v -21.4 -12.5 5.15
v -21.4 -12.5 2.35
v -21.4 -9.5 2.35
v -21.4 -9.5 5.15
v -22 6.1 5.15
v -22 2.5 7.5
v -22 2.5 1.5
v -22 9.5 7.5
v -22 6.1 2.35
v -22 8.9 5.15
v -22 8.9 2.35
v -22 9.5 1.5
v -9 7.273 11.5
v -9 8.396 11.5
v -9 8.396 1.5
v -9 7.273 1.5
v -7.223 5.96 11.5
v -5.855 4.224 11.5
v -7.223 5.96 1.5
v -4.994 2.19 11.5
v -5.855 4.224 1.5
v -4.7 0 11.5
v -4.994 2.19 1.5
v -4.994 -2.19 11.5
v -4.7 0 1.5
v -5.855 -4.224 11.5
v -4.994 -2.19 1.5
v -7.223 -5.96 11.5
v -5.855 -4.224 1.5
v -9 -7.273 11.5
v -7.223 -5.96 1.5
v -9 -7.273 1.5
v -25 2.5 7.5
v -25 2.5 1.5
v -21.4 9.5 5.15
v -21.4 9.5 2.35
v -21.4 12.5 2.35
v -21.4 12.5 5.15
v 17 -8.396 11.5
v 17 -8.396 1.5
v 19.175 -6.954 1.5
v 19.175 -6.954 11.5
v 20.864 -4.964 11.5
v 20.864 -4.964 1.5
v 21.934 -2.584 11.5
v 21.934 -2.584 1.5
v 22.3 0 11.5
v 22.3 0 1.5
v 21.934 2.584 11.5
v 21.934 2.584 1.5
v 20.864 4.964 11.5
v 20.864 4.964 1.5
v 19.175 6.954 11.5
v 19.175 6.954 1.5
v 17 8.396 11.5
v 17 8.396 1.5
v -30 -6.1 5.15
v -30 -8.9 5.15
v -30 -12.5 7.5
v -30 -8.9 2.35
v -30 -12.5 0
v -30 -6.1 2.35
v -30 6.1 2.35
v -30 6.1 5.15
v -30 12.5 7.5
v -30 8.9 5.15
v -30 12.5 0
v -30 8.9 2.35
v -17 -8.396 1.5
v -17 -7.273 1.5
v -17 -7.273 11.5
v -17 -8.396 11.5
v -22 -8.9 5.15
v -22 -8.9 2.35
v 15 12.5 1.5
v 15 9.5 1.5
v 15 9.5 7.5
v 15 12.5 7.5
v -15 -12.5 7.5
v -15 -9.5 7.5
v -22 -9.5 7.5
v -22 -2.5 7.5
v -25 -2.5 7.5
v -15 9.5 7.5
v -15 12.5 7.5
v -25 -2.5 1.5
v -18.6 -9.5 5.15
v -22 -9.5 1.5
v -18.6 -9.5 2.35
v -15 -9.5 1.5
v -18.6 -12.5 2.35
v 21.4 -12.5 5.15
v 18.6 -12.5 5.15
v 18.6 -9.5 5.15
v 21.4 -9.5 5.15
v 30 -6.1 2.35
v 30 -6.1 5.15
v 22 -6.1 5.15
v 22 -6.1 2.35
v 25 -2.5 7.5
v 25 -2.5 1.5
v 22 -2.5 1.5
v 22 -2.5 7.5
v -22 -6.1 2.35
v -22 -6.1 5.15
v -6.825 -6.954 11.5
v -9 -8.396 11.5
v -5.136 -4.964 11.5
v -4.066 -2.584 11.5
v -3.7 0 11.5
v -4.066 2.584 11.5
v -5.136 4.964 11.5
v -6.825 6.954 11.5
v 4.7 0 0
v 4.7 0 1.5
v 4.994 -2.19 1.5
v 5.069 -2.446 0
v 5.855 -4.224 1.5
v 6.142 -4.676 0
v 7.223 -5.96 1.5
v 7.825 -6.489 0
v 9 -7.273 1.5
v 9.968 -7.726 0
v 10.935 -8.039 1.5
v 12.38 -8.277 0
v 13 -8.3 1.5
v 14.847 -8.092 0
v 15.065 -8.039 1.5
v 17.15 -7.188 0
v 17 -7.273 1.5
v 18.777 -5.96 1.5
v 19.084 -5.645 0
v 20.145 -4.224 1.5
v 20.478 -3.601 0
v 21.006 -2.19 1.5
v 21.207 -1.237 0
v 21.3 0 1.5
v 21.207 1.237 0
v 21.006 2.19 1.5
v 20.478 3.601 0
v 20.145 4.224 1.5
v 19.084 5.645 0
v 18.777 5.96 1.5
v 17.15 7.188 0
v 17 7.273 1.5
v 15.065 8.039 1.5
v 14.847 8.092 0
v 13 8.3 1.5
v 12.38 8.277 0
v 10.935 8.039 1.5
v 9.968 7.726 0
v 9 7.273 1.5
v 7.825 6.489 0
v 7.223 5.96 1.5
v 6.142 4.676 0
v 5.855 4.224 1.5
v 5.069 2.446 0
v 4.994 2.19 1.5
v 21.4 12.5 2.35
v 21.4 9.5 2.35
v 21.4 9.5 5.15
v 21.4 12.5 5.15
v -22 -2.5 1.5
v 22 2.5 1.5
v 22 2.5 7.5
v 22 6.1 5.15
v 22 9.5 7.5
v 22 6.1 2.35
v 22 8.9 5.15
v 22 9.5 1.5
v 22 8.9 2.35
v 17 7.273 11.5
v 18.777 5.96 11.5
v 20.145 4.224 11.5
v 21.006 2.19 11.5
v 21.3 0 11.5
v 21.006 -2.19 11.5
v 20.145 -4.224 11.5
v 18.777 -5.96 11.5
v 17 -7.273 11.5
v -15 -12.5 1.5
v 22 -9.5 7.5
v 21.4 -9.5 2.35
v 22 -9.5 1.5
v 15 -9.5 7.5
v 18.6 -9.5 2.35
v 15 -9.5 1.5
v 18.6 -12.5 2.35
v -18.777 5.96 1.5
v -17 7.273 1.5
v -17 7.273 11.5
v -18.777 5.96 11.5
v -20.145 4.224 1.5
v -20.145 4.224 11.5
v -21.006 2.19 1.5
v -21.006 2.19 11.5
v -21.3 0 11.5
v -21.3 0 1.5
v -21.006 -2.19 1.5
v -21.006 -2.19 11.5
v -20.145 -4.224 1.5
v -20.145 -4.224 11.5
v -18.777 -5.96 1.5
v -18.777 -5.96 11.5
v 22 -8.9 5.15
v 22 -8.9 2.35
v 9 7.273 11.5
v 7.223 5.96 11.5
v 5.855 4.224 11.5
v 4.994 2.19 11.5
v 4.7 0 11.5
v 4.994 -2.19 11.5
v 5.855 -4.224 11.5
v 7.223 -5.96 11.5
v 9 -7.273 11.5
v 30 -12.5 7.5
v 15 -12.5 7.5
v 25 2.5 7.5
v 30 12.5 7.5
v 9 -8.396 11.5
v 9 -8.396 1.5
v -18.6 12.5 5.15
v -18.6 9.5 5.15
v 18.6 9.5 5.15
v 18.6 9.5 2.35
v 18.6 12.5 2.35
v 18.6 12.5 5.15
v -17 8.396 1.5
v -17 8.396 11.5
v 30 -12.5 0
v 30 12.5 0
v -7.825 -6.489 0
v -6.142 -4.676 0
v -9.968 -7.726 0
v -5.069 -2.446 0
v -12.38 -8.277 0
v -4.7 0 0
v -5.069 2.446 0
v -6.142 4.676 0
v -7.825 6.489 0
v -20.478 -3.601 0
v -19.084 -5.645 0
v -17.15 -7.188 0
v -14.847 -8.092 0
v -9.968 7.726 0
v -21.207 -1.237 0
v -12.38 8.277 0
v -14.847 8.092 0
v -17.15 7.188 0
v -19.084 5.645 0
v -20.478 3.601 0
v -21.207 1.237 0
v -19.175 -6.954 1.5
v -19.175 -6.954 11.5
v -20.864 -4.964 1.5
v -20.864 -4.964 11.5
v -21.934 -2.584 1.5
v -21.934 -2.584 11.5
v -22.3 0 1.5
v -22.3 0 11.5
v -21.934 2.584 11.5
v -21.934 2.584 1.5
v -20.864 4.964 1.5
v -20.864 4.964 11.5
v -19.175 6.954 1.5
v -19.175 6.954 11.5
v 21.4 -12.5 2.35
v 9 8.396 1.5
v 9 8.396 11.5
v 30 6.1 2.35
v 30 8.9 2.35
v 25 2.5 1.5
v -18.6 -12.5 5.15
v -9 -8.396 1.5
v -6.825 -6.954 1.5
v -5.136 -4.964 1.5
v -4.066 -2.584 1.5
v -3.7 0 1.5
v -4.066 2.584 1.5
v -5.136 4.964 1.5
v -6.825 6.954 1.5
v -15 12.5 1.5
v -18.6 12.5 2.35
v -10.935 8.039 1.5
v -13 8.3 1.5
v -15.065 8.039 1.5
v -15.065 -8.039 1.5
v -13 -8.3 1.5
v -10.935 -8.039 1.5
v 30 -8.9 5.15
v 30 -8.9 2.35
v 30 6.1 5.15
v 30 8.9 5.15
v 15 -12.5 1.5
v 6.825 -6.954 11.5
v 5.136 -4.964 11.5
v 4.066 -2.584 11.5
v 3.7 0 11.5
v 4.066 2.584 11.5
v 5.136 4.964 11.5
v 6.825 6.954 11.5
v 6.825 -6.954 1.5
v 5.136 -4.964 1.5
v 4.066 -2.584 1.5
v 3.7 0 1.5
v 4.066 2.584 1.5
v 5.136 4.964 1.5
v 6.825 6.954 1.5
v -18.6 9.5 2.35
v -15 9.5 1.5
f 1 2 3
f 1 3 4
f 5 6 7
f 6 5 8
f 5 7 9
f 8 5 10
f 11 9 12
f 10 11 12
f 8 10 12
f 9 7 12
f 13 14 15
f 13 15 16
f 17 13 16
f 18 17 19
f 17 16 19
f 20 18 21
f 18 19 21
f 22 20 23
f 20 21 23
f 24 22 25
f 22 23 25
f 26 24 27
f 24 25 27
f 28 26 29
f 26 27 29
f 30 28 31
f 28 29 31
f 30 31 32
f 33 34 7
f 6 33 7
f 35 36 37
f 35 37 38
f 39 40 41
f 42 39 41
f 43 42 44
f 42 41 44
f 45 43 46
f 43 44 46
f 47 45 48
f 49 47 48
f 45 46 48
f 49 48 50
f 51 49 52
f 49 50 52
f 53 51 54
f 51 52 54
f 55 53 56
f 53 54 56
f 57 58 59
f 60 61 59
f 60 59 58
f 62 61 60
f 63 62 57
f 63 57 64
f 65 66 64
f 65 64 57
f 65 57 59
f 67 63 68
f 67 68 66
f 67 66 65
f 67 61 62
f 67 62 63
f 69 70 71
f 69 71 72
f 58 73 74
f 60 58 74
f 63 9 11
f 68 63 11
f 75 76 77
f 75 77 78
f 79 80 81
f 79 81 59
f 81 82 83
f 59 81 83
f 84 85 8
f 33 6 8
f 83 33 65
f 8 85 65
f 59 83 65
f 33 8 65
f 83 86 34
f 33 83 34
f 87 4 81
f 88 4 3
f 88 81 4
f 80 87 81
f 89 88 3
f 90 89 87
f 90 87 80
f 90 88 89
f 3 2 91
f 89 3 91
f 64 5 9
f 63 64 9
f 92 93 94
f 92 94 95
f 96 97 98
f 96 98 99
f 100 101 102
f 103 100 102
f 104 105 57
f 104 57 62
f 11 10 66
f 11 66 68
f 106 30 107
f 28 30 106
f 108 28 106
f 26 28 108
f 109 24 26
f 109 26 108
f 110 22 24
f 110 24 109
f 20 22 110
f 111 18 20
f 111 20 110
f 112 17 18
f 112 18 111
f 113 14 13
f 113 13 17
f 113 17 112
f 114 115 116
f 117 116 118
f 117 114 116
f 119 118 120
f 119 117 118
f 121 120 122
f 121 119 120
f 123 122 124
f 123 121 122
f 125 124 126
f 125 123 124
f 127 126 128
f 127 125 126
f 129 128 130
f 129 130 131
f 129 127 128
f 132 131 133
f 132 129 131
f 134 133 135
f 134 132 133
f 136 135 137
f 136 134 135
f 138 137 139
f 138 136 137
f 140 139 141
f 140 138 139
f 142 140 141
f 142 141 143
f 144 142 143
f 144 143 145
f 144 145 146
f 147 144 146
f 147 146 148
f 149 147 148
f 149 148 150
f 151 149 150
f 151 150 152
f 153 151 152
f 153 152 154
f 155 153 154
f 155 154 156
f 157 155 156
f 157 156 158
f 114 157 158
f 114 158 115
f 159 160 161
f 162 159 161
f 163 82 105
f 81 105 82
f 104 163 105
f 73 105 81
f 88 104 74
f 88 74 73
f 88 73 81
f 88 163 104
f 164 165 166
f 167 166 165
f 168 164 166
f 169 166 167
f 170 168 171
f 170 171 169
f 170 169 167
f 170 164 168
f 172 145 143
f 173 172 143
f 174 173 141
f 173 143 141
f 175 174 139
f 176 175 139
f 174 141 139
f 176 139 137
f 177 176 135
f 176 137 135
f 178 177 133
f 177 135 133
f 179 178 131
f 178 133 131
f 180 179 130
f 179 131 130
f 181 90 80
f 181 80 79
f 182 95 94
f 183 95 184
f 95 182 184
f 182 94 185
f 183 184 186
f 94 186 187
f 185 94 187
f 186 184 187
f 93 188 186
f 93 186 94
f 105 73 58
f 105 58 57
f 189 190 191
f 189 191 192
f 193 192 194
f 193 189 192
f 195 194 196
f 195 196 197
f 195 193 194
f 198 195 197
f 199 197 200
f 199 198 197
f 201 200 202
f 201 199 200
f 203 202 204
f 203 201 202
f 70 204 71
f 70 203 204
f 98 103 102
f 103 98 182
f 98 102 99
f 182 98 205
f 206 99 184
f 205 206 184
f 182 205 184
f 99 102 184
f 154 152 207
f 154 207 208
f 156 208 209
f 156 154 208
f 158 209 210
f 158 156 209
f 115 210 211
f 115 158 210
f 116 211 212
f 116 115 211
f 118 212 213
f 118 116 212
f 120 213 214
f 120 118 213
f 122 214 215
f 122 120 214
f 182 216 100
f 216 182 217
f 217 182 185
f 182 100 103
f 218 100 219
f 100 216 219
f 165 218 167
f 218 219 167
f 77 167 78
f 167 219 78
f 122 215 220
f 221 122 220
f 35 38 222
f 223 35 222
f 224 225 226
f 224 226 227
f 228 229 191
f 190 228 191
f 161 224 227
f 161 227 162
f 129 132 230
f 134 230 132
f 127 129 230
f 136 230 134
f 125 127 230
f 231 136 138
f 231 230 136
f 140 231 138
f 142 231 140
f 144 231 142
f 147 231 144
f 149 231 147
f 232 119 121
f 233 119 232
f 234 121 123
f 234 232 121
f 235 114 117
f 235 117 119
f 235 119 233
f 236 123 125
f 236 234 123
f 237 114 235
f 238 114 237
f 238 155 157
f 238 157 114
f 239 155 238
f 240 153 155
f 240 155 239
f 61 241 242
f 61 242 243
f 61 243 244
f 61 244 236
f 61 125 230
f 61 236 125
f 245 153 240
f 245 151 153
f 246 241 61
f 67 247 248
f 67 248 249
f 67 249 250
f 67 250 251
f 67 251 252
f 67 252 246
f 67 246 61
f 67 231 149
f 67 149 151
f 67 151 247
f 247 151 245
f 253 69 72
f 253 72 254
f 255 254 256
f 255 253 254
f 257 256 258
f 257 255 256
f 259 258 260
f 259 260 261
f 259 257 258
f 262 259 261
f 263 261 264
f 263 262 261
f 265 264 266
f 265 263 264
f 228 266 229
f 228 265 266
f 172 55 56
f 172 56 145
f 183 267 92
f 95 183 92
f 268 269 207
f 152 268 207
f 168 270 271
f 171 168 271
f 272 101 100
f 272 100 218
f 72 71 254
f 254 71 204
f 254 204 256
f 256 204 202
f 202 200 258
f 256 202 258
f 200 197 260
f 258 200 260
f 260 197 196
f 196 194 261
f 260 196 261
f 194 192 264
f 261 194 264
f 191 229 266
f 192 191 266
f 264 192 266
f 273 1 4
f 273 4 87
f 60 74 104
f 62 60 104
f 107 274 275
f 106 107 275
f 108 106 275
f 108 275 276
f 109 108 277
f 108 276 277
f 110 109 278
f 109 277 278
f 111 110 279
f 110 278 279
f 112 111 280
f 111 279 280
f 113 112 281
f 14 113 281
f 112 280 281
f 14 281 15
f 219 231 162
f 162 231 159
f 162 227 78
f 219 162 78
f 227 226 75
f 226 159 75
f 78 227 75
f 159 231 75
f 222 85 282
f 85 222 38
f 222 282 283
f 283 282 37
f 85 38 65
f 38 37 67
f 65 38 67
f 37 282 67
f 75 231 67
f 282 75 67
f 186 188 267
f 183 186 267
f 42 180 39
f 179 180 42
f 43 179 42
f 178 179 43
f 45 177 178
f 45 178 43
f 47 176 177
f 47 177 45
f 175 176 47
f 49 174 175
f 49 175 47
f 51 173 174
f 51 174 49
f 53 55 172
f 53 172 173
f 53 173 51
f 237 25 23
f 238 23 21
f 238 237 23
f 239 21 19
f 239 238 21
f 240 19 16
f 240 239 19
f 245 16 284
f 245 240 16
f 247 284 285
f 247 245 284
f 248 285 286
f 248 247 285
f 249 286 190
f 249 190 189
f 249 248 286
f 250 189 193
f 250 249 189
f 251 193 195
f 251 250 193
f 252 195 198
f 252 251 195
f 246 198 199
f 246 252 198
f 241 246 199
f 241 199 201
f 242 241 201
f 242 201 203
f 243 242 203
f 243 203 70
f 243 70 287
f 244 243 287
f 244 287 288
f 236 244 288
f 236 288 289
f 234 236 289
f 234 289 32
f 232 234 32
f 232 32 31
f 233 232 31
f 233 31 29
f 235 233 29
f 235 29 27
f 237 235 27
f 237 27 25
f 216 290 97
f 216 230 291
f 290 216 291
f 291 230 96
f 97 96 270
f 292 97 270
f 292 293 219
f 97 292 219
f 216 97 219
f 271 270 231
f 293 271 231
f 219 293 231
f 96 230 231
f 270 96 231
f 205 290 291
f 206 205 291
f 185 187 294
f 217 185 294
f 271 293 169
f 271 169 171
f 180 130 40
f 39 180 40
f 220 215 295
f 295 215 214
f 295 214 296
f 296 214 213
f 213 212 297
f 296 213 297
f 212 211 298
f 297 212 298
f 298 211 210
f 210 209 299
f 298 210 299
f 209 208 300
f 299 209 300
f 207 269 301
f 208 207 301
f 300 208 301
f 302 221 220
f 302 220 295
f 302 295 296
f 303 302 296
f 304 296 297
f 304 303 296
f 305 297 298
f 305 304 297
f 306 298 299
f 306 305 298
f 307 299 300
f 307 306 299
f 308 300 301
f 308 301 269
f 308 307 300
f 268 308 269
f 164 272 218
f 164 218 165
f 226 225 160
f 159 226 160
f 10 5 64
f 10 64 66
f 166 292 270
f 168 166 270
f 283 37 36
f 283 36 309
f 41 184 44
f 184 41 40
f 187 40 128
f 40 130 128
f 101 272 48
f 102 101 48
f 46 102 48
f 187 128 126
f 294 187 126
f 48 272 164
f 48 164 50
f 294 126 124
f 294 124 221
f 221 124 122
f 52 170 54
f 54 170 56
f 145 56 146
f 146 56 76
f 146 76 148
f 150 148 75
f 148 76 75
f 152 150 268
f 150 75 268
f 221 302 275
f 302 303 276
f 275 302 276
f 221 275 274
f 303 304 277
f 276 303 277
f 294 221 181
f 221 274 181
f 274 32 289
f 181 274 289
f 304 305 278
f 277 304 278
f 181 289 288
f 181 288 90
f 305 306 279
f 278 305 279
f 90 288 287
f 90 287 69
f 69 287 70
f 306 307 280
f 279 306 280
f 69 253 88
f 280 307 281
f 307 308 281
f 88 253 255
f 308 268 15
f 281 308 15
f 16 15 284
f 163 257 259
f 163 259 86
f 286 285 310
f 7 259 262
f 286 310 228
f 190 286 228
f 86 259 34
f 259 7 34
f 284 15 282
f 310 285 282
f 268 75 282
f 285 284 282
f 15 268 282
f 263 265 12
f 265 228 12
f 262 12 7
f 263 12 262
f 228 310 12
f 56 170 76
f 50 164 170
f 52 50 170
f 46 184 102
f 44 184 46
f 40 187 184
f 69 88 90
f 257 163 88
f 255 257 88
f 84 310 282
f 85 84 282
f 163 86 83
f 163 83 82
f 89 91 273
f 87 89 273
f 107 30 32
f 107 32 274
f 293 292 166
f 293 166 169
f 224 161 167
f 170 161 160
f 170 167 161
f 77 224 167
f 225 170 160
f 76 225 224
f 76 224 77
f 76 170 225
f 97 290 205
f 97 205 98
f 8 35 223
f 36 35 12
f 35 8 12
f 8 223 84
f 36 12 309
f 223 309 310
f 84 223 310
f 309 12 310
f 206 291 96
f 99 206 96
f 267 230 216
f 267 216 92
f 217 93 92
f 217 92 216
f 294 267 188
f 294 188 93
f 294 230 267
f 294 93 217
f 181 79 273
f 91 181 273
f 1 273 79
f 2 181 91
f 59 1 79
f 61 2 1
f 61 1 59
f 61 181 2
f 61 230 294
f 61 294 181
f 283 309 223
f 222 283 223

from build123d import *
from build123d.topology import SkipClean

# Parameters (mm, degrees)
ESBO_O1_R                = 8.3
RESSALTO_EXTRUS_O1_DEPTH = 1.5
RESSALTO_EXTRUS_O2_DEPTH = 6
ESBO_O3_W                = 2.8
ESBO_O3_H                = 2.8
CORTE_EXTRUS_O1_DEPTH    = 37.142080737
ESBO_O4_W                = 2.8
ESBO_O4_H                = 2.8
CORTE_EXTRUS_O2_DEPTH    = 53.08166664
ESBO_O6_W                = 5
ESBO_O6_H                = 25
RESSALTO_EXTRUS_O5_DEPTH = 7.5
ESBO_O7_W                = 2.8
ESBO_O7_H                = 2.8
CORTE_EXTRUS_O3_DEPTH    = 60
RESSALTO_EXTRUS_O3_DEPTH = 10


with BuildPart() as part:
    # Esboço1 → Ressalto-extrusão1 (new body)
    with BuildSketch(Plane.XY):
        Polygon((-25, -12.5), (-25, 12.5), (25, 12.5), (25, -12.5), (15, -12.5), (-15, -12.5), align=None)
        with Locations((-13, 0)):
            Circle(ESBO_O1_R, mode=Mode.SUBTRACT)
        with Locations(Location((13, 0, 0), (0, 0, 180))):
            Circle(ESBO_O1_R, mode=Mode.SUBTRACT)
    extrude(amount=RESSALTO_EXTRUS_O1_DEPTH)

    # Esboço2 → Ressalto-extrusão2 (add)
    with BuildSketch(Plane.XY.offset(1.5)):
        Polygon((-20, -12.5), (-25, -12.5), (-25, -2.5), (-22, -2.5), (-22, -9.5), (-15, -9.5), (-15, -12.5), align=None)
        Polygon((22, -2.5), (22, -9.5), (15, -9.5), (15, -12.5), (20, -12.5), (25, -12.5), (25, -2.5), align=None)
        Polygon((20, 12.5), (25, 12.5), (25, 2.5), (22, 2.5), (22, 9.5), (15, 9.5), (15, 12.5), align=None)
        Polygon((-22, 2.5), (-22, 9.5), (-15, 9.5), (-15, 12.5), (-20, 12.5), (-25, 12.5), (-25, 2.5), align=None)
    extrude(amount=RESSALTO_EXTRUS_O2_DEPTH)

    # Esboço3 → Corte-extrusão1 (cut, through all)
    with BuildSketch(Plane.XZ.offset(12.5)):
        with Locations((-20, 3.75)):
            Rectangle(ESBO_O3_W, ESBO_O3_H)
        with Locations((20, 3.75)):
            Rectangle(ESBO_O3_W, ESBO_O3_H)
    extrude(amount=-CORTE_EXTRUS_O1_DEPTH, mode=Mode.SUBTRACT)

    # Esboço4 → Corte-extrusão2 (cut, through all)
    with BuildSketch(Plane.ZY.offset(25)):
        with Locations((3.75, 7.5)):
            Rectangle(ESBO_O4_W, ESBO_O4_H)
        with Locations((3.75, -7.5)):
            Rectangle(ESBO_O4_W, ESBO_O4_H)
    extrude(amount=-CORTE_EXTRUS_O2_DEPTH, mode=Mode.SUBTRACT)

    # Esboço6 → Ressalto-extrusão5 (add)
    with BuildSketch(Plane(origin=(0, 0, 0), x_dir=(-1, 0, 0), z_dir=(0, 0, -1))):
        with Locations((-27.5, 0)):
            Rectangle(ESBO_O6_W, ESBO_O6_H)
        with Locations((27.5, 0)):
            Rectangle(ESBO_O6_W, ESBO_O6_H)
    extrude(amount=-RESSALTO_EXTRUS_O5_DEPTH)

    # Esboço7 → Corte-extrusão3 (cut)
    with BuildSketch(Plane(origin=(30, 0, 0), x_dir=(0, 0, -1), z_dir=(1, 0, 0))):
        with Locations((-3.75, -7.5)):
            Rectangle(ESBO_O7_W, ESBO_O7_H)
        with Locations((-3.75, 7.5)):
            Rectangle(ESBO_O7_W, ESBO_O7_H)
    extrude(amount=-CORTE_EXTRUS_O3_DEPTH, mode=Mode.SUBTRACT)

    # Esboço5 → Ressalto-extrusão3 (add)
    with SkipClean():  # the faces are left unmerged after this step: merging them gives an invalid solid
        with BuildSketch(Plane.XY.offset(1.5)):
            with BuildLine():
                Line((-9, -7.272551134), (-9, -8.395832299))
                ThreePointArc((-9, -8.395832299), (-3.7, 0), (-9, 8.395832299))
                Line((-9, 8.395832299), (-9, 7.272551134))
                ThreePointArc((-9, 7.272551134), (-4.7, 0), (-9, -7.272551134))
            make_face()
            with BuildLine():
                Line((-17, -7.272551134), (-17, -8.395832299))
                ThreePointArc((-17, -8.395832299), (-22.3, 0), (-17, 8.395832299))
                Line((-17, 8.395832299), (-17, 7.272551134))
                ThreePointArc((-17, 7.272551134), (-21.3, 0), (-17, -7.272551134))
            make_face()
            with BuildLine():
                Line((9, -7.272551134), (9, -8.395832299))
                ThreePointArc((9, -8.395832299), (3.7, 0), (9, 8.395832299))
                Line((9, 8.395832299), (9, 7.272551134))
                ThreePointArc((9, 7.272551134), (4.7, 0), (9, -7.272551134))
            make_face()
            with BuildLine():
                Line((17, 8.395832299), (17, 7.272551134))
                ThreePointArc((17, 7.272551134), (21.3, 0), (17, -7.272551134))
                Line((17, -7.272551134), (17, -8.395832299))
                ThreePointArc((17, -8.395832299), (22.3, 0), (17, 8.395832299))
            make_face()
        extrude(amount=RESSALTO_EXTRUS_O3_DEPTH)


solid = part.part
